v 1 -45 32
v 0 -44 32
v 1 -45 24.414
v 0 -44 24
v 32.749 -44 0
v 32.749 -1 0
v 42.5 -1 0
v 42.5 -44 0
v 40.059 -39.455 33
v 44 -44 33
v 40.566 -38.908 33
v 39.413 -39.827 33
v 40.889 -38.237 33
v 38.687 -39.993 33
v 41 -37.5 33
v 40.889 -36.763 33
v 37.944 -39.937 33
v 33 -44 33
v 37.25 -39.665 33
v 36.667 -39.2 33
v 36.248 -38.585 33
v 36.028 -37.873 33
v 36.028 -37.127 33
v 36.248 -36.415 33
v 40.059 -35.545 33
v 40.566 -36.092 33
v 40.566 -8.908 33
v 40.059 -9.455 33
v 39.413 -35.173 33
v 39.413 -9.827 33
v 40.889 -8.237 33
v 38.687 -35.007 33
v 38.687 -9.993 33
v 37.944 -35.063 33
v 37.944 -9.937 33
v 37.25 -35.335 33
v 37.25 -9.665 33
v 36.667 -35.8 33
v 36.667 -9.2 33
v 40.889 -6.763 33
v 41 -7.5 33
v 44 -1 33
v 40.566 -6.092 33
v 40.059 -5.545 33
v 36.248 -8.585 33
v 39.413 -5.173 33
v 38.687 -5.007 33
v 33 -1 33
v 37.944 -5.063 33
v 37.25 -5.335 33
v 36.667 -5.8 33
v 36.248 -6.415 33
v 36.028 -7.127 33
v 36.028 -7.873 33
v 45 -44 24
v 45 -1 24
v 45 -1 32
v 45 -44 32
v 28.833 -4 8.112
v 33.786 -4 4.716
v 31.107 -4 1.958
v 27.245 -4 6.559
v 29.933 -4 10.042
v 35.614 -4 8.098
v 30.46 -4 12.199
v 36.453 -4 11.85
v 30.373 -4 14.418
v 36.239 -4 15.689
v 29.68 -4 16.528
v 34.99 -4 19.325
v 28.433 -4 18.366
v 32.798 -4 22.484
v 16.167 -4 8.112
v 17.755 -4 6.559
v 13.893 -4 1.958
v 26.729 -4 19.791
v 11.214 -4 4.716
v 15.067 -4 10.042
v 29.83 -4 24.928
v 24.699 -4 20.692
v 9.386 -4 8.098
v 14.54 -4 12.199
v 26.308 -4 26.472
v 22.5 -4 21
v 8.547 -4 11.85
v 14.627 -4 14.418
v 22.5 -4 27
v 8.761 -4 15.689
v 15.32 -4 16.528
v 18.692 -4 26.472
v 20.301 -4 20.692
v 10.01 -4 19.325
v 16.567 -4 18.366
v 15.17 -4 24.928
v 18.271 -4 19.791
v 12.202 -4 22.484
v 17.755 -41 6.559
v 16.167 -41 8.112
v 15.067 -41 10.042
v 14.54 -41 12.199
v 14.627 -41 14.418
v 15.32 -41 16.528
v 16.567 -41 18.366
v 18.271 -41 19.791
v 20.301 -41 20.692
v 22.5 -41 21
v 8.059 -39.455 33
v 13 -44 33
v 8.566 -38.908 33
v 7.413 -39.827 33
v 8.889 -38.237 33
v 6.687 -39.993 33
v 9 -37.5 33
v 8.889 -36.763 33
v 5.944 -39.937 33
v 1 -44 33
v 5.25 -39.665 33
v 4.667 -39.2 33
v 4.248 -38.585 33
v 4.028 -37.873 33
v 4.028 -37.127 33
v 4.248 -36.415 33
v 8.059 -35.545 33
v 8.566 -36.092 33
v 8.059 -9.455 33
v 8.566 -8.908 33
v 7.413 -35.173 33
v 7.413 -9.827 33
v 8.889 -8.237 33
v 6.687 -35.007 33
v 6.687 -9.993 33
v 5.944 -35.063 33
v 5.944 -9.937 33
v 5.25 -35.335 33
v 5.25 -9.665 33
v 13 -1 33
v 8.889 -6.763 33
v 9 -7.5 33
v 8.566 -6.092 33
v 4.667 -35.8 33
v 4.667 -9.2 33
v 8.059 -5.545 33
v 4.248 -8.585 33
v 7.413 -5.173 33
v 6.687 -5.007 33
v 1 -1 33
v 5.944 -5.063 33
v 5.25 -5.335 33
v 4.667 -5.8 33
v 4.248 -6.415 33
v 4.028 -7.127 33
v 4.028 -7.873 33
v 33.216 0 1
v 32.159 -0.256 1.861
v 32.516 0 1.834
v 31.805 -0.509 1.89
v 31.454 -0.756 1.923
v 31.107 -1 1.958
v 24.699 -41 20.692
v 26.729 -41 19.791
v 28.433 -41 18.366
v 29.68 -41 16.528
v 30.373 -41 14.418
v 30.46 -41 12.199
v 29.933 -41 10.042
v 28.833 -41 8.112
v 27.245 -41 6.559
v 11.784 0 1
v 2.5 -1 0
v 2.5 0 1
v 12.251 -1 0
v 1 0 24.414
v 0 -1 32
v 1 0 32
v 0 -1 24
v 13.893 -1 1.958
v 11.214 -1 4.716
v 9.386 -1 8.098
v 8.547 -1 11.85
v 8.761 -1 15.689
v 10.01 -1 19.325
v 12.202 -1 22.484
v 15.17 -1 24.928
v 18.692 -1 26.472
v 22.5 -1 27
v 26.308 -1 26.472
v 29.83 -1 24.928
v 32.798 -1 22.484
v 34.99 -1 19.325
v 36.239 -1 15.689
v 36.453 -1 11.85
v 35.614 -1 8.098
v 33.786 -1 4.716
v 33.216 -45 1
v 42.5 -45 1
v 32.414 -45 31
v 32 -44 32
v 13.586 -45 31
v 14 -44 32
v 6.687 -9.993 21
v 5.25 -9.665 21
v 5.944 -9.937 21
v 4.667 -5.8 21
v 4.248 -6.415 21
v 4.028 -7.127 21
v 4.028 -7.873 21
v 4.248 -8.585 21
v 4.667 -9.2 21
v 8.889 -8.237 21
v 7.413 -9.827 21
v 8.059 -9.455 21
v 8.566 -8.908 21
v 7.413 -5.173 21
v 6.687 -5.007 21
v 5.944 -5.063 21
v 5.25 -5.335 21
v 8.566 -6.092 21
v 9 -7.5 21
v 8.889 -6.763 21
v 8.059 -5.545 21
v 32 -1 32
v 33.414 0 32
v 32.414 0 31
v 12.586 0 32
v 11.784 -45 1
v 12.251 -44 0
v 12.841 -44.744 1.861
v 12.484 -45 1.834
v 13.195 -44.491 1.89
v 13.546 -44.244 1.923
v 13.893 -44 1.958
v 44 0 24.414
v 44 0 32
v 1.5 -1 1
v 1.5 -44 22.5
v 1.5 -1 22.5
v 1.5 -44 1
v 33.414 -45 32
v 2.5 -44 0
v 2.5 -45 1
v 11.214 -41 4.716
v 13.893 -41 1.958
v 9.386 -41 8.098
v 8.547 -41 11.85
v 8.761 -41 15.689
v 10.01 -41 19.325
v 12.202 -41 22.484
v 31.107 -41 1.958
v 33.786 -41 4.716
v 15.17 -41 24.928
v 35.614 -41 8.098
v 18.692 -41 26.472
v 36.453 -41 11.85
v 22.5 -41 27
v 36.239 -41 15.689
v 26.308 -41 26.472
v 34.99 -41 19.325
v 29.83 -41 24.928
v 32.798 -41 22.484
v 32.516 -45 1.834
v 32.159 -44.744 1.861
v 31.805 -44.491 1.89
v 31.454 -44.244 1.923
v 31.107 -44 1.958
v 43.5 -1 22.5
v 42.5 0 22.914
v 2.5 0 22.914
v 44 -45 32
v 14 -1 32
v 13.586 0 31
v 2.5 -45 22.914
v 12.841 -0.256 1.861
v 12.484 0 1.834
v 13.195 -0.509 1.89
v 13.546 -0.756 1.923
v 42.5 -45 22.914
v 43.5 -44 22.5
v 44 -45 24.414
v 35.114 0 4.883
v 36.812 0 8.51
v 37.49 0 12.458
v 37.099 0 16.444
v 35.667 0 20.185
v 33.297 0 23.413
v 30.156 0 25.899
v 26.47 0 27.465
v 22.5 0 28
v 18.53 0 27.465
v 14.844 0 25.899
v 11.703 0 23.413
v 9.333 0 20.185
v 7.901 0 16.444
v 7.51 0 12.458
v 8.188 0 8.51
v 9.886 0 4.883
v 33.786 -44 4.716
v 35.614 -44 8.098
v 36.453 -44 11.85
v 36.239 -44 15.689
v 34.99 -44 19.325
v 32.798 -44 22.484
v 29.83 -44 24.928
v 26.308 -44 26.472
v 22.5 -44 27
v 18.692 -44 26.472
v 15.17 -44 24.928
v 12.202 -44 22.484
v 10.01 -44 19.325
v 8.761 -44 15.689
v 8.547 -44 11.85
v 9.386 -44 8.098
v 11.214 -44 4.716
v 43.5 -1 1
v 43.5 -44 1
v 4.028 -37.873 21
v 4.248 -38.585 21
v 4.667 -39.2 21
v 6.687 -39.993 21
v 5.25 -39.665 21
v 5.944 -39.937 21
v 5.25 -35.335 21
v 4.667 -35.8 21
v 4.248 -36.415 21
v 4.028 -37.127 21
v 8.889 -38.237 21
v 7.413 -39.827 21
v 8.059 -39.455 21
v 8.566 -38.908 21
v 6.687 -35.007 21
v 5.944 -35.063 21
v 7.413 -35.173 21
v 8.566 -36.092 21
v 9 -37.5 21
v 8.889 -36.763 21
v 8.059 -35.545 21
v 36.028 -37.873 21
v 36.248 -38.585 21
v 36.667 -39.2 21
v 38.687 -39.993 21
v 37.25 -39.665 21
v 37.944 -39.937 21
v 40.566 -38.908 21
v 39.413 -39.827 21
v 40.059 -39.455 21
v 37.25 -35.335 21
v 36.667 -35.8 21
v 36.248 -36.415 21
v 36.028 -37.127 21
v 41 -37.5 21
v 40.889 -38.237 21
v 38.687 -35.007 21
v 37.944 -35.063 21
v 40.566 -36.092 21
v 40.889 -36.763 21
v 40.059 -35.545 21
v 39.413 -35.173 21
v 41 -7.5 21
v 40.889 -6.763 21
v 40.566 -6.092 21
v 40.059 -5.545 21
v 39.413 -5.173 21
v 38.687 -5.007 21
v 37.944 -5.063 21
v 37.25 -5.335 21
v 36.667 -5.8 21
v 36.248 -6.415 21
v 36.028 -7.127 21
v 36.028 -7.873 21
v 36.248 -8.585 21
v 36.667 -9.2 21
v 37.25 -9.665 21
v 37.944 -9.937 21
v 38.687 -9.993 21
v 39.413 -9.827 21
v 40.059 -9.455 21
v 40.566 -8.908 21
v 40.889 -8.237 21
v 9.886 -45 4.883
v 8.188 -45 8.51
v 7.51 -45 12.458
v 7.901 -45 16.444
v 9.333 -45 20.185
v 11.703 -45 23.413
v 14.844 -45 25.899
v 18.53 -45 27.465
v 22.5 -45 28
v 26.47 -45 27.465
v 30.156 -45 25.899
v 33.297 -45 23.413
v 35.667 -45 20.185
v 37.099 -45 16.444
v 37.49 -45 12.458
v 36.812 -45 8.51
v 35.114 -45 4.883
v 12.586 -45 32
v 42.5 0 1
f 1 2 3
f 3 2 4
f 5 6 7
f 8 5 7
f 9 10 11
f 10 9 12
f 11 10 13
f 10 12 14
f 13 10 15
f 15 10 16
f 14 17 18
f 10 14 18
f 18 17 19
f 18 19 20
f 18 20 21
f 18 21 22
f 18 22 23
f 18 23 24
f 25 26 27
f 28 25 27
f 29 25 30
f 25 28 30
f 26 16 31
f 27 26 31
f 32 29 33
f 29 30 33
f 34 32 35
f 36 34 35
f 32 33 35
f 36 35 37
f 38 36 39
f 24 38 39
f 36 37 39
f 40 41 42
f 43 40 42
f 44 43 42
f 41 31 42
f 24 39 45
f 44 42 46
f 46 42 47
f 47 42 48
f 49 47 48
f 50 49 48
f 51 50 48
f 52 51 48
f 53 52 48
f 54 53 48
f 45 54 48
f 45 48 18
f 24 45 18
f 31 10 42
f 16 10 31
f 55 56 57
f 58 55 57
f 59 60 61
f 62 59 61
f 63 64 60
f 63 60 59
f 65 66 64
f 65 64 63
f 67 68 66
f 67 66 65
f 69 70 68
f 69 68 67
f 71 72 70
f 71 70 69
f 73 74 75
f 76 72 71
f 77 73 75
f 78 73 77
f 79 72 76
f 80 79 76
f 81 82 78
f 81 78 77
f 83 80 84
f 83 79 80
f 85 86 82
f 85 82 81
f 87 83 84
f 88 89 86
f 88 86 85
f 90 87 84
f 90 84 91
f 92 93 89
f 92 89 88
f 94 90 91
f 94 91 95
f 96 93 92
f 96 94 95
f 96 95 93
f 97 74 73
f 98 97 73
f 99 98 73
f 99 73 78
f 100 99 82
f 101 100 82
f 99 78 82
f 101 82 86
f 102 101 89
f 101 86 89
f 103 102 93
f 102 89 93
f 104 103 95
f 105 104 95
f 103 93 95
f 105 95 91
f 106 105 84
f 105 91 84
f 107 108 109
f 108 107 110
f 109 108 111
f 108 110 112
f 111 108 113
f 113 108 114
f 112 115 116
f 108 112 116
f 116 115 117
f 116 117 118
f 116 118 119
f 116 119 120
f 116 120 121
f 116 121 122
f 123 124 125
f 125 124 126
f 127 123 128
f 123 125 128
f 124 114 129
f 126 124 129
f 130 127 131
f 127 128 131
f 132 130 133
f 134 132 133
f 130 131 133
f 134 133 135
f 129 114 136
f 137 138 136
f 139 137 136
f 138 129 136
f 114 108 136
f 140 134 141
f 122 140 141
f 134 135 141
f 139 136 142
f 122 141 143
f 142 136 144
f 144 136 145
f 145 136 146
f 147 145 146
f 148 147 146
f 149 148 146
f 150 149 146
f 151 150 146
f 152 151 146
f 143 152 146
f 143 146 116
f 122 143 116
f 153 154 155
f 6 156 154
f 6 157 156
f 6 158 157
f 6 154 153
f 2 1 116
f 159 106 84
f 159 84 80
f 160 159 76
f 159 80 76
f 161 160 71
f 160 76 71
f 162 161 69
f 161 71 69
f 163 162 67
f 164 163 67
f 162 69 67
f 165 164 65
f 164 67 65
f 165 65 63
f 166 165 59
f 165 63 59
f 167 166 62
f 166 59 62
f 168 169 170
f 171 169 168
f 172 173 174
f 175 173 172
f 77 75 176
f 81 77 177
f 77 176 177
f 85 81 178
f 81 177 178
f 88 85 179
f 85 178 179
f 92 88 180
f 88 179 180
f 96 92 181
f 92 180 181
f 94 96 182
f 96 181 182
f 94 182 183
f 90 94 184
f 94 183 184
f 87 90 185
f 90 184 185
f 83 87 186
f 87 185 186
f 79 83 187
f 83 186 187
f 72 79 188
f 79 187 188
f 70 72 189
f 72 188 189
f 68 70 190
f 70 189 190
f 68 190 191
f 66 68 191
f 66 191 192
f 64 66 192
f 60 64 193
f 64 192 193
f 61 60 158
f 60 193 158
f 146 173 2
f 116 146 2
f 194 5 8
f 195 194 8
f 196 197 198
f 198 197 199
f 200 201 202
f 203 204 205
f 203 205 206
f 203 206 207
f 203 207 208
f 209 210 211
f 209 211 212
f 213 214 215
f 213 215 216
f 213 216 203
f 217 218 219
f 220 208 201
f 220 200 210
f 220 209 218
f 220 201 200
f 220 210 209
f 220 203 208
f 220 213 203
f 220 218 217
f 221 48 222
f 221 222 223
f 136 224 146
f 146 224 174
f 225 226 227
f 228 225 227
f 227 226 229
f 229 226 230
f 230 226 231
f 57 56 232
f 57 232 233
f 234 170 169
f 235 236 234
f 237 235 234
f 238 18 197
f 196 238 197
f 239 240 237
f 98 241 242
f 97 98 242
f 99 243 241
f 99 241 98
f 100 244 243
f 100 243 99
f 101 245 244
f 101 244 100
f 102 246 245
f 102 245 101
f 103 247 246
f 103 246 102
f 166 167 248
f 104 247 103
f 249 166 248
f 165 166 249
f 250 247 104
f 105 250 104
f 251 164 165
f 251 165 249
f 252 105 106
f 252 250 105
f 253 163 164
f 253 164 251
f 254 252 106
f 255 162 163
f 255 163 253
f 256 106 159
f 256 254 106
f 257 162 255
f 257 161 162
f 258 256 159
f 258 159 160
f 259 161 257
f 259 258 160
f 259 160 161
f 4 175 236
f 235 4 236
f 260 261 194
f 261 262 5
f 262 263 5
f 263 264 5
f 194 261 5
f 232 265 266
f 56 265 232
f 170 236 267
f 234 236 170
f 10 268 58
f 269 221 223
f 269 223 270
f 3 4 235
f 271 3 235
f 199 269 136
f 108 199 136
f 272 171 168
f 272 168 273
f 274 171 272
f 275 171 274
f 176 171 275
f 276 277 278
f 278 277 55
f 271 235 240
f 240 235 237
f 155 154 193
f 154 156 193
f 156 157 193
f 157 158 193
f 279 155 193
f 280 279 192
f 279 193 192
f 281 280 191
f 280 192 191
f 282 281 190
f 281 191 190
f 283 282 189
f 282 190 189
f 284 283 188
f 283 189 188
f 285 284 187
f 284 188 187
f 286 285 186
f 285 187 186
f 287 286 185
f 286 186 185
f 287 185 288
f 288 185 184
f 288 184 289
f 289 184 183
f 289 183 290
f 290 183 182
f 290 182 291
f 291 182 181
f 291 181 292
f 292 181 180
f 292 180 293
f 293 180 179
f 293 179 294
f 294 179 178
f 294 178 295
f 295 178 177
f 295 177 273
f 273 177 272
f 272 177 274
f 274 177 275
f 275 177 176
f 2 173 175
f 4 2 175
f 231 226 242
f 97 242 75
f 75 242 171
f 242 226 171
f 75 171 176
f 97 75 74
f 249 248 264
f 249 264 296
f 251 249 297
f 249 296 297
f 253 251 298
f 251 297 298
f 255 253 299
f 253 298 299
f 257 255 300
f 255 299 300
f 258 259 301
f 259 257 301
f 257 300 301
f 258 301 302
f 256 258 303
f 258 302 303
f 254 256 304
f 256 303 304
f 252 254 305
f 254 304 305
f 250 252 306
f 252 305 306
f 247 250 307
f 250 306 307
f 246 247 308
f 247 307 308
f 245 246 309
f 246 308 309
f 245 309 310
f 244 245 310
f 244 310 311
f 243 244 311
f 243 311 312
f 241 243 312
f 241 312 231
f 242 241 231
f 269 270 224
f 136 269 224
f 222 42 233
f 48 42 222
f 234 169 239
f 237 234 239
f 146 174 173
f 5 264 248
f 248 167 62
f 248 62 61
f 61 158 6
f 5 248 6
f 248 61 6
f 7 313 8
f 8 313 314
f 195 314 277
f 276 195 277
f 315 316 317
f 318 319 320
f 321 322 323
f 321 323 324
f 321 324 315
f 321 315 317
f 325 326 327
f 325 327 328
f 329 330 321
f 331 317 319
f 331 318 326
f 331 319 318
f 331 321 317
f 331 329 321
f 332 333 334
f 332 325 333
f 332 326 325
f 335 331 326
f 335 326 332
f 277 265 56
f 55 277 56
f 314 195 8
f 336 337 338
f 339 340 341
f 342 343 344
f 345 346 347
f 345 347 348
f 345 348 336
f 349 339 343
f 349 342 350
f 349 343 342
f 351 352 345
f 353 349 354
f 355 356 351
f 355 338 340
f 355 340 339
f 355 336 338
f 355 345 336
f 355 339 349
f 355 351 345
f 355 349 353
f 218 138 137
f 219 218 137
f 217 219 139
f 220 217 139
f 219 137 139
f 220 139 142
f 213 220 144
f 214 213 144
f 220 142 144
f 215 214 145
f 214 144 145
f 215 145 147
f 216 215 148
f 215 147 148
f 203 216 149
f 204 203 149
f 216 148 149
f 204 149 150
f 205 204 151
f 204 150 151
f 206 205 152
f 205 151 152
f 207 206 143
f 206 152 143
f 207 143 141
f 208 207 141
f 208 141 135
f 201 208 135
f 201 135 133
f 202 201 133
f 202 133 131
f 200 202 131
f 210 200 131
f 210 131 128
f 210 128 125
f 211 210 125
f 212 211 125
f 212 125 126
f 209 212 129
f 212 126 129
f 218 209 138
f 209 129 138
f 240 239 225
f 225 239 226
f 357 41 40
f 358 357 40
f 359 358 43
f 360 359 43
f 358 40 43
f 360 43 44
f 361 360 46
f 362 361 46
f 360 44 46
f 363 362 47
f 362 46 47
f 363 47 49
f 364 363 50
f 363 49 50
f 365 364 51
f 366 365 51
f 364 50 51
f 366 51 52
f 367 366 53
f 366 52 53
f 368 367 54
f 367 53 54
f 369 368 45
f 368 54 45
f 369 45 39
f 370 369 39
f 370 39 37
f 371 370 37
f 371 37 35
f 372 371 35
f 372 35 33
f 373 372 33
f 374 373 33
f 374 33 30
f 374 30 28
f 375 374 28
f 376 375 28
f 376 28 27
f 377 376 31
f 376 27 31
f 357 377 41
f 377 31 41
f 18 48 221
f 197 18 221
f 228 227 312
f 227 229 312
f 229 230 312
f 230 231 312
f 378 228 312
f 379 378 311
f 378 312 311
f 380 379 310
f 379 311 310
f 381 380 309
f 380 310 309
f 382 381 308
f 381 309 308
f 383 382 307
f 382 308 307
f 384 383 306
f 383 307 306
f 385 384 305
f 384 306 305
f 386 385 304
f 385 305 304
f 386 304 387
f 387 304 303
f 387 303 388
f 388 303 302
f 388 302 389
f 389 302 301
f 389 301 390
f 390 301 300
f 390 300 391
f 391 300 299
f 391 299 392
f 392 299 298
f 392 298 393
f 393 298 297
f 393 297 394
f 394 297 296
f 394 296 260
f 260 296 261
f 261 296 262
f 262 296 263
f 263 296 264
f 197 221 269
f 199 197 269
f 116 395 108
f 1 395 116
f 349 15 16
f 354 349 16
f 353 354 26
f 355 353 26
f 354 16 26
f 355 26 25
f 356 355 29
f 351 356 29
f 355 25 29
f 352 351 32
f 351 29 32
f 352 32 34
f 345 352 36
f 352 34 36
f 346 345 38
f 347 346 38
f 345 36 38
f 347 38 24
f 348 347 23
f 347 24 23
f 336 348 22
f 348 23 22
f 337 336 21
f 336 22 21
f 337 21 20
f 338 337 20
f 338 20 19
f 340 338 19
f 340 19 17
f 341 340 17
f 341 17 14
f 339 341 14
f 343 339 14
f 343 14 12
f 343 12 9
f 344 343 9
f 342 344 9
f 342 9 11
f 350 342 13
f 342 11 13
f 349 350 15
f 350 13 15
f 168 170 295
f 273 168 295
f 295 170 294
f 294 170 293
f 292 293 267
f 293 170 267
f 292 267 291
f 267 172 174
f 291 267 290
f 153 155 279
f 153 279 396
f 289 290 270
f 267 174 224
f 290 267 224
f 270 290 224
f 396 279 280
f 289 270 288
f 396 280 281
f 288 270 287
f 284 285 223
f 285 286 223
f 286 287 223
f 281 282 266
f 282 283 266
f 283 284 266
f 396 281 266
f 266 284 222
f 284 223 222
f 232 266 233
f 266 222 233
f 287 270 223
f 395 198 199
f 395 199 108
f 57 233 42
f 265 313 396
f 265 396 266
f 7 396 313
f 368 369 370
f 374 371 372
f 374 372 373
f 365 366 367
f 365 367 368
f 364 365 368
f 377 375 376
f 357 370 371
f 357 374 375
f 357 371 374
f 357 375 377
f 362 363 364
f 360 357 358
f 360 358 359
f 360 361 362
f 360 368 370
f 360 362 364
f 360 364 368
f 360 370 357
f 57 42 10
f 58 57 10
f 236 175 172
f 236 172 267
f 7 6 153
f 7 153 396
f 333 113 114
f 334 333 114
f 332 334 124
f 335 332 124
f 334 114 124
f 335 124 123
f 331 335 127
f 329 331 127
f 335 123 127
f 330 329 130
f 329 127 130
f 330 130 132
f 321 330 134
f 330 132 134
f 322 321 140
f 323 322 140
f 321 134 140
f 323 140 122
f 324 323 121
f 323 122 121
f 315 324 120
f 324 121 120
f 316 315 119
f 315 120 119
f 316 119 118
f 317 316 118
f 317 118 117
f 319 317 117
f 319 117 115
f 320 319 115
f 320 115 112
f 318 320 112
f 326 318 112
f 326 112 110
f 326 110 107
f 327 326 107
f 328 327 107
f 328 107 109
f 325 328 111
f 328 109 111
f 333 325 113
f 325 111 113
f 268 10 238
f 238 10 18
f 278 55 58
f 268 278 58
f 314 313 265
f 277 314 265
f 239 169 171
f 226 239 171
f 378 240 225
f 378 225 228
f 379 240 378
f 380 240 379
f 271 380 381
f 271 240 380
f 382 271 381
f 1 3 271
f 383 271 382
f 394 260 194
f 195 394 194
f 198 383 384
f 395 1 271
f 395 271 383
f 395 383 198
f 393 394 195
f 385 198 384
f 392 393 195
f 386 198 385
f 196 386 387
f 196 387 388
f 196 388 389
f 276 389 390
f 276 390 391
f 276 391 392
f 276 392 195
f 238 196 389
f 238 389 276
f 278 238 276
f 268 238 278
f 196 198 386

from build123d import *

# Parameters (mm, degrees)
F1_DEPTH = 45
F2_R     = 14
F3_DEPTH = 4
F4_R     = 14
F5_DEPTH = 4
F6_R     = 2.5
F7_DEPTH = 12
F8_SIZE  = 1


with BuildPart() as f1:
    # F0 (on Front) → F1 (new body)
    with BuildSketch(Plane.XZ):
        with BuildLine():
            Line((13, 33), (0, 33))
            Line((0, 33), (0, 24))
            Line((0, 24), (1.5, 22.5))
            Line((1.5, 22.5), (1.5, 0))
            Line((1.5, 0), (12.250585, 0))
            Line((12.250585, 0), (17.754591, 6.559418))
            ThreePointArc((17.754591, 6.559418), (14.899847, 15.497533), (22.5, 21))
            ThreePointArc((22.5, 21), (30.100153, 15.497533), (27.245409, 6.559418))
            Line((27.245409, 6.559418), (32.749415, 0))
            Line((32.749415, 0), (43.5, 0))
            Line((43.5, 0), (43.5, 22.5))
            Line((43.5, 22.5), (45, 24))
            Line((45, 24), (45, 33))
            Line((45, 33), (33, 33))
            Line((33, 33), (32, 32))
            Line((32, 32), (14, 32))
            Line((14, 32), (13, 33))
        make_face()
    extrude(amount=F1_DEPTH)

    # F2 (on face) → F3 (cut)
    with BuildSketch(Plane.XZ.offset(45)):
        with Locations((22.5, 13)):
            Circle(F2_R)
    extrude(amount=-F3_DEPTH, mode=Mode.SUBTRACT)

    # F4 (on face) → F5 (cut)
    with BuildSketch(Plane(origin=(0, 0, 0), x_dir=(-1, 0, 0), z_dir=(0, 1, 0))):
        with Locations((-22.5, 13)):
            Circle(F4_R)
    extrude(amount=-F5_DEPTH, mode=Mode.SUBTRACT)

    # F6 (on face) → F7 (cut)
    with BuildSketch(Plane.XY.offset(33)):
        with Locations((6.5, -37.5)):
            Circle(F6_R)
        with Locations((38.5, -37.5)):
            Circle(F6_R)
        with Locations((6.5, -7.5)):
            Circle(F6_R)
        with Locations((38.5, -7.5)):
            Circle(F6_R)
    extrude(amount=-F7_DEPTH, mode=Mode.SUBTRACT)

    # F8
    f8_edges = [f1.edges().sort_by_distance(p)[0] for p in [
        (22.5, 0, 27),
        (31.927972, 0, 0.978957),
        (38.124707, 0, 0),
        (43.5, 0, 11.25),
        (44.25, 0, 23.25),
        (45, 0, 28.5),
        (39, 0, 33),
        (32.5, 0, 32.5),
        (23, 0, 32),
        (13.5, 0, 32.5),
        (6.5, 0, 33),
        (0, 0, 28.5),
        (0.75, 0, 23.25),
        (1.5, 0, 11.25),
        (6.875293, 0, 0),
        (13.072028, 0, 0.978957),
        (22.5, -45, 27),
        (31.927972, -45, 0.978957),
        (38.124707, -45, 0),
        (43.5, -45, 11.25),
        (44.25, -45, 23.25),
        (45, -45, 28.5),
        (39, -45, 33),
        (32.5, -45, 32.5),
        (23, -45, 32),
        (13.5, -45, 32.5),
        (6.5, -45, 33),
        (0, -45, 28.5),
        (0.75, -45, 23.25),
        (1.5, -45, 11.25),
        (6.875293, -45, 0),
        (13.072028, -45, 0.978957),
        (45, -22.5, 33),
        (0, -22.5, 33),
        (1.5, -22.5, 0),
        (43.5, -22.5, 0),
    ]]
    chamfer(f8_edges, length=F8_SIZE)


solid = f1.part
